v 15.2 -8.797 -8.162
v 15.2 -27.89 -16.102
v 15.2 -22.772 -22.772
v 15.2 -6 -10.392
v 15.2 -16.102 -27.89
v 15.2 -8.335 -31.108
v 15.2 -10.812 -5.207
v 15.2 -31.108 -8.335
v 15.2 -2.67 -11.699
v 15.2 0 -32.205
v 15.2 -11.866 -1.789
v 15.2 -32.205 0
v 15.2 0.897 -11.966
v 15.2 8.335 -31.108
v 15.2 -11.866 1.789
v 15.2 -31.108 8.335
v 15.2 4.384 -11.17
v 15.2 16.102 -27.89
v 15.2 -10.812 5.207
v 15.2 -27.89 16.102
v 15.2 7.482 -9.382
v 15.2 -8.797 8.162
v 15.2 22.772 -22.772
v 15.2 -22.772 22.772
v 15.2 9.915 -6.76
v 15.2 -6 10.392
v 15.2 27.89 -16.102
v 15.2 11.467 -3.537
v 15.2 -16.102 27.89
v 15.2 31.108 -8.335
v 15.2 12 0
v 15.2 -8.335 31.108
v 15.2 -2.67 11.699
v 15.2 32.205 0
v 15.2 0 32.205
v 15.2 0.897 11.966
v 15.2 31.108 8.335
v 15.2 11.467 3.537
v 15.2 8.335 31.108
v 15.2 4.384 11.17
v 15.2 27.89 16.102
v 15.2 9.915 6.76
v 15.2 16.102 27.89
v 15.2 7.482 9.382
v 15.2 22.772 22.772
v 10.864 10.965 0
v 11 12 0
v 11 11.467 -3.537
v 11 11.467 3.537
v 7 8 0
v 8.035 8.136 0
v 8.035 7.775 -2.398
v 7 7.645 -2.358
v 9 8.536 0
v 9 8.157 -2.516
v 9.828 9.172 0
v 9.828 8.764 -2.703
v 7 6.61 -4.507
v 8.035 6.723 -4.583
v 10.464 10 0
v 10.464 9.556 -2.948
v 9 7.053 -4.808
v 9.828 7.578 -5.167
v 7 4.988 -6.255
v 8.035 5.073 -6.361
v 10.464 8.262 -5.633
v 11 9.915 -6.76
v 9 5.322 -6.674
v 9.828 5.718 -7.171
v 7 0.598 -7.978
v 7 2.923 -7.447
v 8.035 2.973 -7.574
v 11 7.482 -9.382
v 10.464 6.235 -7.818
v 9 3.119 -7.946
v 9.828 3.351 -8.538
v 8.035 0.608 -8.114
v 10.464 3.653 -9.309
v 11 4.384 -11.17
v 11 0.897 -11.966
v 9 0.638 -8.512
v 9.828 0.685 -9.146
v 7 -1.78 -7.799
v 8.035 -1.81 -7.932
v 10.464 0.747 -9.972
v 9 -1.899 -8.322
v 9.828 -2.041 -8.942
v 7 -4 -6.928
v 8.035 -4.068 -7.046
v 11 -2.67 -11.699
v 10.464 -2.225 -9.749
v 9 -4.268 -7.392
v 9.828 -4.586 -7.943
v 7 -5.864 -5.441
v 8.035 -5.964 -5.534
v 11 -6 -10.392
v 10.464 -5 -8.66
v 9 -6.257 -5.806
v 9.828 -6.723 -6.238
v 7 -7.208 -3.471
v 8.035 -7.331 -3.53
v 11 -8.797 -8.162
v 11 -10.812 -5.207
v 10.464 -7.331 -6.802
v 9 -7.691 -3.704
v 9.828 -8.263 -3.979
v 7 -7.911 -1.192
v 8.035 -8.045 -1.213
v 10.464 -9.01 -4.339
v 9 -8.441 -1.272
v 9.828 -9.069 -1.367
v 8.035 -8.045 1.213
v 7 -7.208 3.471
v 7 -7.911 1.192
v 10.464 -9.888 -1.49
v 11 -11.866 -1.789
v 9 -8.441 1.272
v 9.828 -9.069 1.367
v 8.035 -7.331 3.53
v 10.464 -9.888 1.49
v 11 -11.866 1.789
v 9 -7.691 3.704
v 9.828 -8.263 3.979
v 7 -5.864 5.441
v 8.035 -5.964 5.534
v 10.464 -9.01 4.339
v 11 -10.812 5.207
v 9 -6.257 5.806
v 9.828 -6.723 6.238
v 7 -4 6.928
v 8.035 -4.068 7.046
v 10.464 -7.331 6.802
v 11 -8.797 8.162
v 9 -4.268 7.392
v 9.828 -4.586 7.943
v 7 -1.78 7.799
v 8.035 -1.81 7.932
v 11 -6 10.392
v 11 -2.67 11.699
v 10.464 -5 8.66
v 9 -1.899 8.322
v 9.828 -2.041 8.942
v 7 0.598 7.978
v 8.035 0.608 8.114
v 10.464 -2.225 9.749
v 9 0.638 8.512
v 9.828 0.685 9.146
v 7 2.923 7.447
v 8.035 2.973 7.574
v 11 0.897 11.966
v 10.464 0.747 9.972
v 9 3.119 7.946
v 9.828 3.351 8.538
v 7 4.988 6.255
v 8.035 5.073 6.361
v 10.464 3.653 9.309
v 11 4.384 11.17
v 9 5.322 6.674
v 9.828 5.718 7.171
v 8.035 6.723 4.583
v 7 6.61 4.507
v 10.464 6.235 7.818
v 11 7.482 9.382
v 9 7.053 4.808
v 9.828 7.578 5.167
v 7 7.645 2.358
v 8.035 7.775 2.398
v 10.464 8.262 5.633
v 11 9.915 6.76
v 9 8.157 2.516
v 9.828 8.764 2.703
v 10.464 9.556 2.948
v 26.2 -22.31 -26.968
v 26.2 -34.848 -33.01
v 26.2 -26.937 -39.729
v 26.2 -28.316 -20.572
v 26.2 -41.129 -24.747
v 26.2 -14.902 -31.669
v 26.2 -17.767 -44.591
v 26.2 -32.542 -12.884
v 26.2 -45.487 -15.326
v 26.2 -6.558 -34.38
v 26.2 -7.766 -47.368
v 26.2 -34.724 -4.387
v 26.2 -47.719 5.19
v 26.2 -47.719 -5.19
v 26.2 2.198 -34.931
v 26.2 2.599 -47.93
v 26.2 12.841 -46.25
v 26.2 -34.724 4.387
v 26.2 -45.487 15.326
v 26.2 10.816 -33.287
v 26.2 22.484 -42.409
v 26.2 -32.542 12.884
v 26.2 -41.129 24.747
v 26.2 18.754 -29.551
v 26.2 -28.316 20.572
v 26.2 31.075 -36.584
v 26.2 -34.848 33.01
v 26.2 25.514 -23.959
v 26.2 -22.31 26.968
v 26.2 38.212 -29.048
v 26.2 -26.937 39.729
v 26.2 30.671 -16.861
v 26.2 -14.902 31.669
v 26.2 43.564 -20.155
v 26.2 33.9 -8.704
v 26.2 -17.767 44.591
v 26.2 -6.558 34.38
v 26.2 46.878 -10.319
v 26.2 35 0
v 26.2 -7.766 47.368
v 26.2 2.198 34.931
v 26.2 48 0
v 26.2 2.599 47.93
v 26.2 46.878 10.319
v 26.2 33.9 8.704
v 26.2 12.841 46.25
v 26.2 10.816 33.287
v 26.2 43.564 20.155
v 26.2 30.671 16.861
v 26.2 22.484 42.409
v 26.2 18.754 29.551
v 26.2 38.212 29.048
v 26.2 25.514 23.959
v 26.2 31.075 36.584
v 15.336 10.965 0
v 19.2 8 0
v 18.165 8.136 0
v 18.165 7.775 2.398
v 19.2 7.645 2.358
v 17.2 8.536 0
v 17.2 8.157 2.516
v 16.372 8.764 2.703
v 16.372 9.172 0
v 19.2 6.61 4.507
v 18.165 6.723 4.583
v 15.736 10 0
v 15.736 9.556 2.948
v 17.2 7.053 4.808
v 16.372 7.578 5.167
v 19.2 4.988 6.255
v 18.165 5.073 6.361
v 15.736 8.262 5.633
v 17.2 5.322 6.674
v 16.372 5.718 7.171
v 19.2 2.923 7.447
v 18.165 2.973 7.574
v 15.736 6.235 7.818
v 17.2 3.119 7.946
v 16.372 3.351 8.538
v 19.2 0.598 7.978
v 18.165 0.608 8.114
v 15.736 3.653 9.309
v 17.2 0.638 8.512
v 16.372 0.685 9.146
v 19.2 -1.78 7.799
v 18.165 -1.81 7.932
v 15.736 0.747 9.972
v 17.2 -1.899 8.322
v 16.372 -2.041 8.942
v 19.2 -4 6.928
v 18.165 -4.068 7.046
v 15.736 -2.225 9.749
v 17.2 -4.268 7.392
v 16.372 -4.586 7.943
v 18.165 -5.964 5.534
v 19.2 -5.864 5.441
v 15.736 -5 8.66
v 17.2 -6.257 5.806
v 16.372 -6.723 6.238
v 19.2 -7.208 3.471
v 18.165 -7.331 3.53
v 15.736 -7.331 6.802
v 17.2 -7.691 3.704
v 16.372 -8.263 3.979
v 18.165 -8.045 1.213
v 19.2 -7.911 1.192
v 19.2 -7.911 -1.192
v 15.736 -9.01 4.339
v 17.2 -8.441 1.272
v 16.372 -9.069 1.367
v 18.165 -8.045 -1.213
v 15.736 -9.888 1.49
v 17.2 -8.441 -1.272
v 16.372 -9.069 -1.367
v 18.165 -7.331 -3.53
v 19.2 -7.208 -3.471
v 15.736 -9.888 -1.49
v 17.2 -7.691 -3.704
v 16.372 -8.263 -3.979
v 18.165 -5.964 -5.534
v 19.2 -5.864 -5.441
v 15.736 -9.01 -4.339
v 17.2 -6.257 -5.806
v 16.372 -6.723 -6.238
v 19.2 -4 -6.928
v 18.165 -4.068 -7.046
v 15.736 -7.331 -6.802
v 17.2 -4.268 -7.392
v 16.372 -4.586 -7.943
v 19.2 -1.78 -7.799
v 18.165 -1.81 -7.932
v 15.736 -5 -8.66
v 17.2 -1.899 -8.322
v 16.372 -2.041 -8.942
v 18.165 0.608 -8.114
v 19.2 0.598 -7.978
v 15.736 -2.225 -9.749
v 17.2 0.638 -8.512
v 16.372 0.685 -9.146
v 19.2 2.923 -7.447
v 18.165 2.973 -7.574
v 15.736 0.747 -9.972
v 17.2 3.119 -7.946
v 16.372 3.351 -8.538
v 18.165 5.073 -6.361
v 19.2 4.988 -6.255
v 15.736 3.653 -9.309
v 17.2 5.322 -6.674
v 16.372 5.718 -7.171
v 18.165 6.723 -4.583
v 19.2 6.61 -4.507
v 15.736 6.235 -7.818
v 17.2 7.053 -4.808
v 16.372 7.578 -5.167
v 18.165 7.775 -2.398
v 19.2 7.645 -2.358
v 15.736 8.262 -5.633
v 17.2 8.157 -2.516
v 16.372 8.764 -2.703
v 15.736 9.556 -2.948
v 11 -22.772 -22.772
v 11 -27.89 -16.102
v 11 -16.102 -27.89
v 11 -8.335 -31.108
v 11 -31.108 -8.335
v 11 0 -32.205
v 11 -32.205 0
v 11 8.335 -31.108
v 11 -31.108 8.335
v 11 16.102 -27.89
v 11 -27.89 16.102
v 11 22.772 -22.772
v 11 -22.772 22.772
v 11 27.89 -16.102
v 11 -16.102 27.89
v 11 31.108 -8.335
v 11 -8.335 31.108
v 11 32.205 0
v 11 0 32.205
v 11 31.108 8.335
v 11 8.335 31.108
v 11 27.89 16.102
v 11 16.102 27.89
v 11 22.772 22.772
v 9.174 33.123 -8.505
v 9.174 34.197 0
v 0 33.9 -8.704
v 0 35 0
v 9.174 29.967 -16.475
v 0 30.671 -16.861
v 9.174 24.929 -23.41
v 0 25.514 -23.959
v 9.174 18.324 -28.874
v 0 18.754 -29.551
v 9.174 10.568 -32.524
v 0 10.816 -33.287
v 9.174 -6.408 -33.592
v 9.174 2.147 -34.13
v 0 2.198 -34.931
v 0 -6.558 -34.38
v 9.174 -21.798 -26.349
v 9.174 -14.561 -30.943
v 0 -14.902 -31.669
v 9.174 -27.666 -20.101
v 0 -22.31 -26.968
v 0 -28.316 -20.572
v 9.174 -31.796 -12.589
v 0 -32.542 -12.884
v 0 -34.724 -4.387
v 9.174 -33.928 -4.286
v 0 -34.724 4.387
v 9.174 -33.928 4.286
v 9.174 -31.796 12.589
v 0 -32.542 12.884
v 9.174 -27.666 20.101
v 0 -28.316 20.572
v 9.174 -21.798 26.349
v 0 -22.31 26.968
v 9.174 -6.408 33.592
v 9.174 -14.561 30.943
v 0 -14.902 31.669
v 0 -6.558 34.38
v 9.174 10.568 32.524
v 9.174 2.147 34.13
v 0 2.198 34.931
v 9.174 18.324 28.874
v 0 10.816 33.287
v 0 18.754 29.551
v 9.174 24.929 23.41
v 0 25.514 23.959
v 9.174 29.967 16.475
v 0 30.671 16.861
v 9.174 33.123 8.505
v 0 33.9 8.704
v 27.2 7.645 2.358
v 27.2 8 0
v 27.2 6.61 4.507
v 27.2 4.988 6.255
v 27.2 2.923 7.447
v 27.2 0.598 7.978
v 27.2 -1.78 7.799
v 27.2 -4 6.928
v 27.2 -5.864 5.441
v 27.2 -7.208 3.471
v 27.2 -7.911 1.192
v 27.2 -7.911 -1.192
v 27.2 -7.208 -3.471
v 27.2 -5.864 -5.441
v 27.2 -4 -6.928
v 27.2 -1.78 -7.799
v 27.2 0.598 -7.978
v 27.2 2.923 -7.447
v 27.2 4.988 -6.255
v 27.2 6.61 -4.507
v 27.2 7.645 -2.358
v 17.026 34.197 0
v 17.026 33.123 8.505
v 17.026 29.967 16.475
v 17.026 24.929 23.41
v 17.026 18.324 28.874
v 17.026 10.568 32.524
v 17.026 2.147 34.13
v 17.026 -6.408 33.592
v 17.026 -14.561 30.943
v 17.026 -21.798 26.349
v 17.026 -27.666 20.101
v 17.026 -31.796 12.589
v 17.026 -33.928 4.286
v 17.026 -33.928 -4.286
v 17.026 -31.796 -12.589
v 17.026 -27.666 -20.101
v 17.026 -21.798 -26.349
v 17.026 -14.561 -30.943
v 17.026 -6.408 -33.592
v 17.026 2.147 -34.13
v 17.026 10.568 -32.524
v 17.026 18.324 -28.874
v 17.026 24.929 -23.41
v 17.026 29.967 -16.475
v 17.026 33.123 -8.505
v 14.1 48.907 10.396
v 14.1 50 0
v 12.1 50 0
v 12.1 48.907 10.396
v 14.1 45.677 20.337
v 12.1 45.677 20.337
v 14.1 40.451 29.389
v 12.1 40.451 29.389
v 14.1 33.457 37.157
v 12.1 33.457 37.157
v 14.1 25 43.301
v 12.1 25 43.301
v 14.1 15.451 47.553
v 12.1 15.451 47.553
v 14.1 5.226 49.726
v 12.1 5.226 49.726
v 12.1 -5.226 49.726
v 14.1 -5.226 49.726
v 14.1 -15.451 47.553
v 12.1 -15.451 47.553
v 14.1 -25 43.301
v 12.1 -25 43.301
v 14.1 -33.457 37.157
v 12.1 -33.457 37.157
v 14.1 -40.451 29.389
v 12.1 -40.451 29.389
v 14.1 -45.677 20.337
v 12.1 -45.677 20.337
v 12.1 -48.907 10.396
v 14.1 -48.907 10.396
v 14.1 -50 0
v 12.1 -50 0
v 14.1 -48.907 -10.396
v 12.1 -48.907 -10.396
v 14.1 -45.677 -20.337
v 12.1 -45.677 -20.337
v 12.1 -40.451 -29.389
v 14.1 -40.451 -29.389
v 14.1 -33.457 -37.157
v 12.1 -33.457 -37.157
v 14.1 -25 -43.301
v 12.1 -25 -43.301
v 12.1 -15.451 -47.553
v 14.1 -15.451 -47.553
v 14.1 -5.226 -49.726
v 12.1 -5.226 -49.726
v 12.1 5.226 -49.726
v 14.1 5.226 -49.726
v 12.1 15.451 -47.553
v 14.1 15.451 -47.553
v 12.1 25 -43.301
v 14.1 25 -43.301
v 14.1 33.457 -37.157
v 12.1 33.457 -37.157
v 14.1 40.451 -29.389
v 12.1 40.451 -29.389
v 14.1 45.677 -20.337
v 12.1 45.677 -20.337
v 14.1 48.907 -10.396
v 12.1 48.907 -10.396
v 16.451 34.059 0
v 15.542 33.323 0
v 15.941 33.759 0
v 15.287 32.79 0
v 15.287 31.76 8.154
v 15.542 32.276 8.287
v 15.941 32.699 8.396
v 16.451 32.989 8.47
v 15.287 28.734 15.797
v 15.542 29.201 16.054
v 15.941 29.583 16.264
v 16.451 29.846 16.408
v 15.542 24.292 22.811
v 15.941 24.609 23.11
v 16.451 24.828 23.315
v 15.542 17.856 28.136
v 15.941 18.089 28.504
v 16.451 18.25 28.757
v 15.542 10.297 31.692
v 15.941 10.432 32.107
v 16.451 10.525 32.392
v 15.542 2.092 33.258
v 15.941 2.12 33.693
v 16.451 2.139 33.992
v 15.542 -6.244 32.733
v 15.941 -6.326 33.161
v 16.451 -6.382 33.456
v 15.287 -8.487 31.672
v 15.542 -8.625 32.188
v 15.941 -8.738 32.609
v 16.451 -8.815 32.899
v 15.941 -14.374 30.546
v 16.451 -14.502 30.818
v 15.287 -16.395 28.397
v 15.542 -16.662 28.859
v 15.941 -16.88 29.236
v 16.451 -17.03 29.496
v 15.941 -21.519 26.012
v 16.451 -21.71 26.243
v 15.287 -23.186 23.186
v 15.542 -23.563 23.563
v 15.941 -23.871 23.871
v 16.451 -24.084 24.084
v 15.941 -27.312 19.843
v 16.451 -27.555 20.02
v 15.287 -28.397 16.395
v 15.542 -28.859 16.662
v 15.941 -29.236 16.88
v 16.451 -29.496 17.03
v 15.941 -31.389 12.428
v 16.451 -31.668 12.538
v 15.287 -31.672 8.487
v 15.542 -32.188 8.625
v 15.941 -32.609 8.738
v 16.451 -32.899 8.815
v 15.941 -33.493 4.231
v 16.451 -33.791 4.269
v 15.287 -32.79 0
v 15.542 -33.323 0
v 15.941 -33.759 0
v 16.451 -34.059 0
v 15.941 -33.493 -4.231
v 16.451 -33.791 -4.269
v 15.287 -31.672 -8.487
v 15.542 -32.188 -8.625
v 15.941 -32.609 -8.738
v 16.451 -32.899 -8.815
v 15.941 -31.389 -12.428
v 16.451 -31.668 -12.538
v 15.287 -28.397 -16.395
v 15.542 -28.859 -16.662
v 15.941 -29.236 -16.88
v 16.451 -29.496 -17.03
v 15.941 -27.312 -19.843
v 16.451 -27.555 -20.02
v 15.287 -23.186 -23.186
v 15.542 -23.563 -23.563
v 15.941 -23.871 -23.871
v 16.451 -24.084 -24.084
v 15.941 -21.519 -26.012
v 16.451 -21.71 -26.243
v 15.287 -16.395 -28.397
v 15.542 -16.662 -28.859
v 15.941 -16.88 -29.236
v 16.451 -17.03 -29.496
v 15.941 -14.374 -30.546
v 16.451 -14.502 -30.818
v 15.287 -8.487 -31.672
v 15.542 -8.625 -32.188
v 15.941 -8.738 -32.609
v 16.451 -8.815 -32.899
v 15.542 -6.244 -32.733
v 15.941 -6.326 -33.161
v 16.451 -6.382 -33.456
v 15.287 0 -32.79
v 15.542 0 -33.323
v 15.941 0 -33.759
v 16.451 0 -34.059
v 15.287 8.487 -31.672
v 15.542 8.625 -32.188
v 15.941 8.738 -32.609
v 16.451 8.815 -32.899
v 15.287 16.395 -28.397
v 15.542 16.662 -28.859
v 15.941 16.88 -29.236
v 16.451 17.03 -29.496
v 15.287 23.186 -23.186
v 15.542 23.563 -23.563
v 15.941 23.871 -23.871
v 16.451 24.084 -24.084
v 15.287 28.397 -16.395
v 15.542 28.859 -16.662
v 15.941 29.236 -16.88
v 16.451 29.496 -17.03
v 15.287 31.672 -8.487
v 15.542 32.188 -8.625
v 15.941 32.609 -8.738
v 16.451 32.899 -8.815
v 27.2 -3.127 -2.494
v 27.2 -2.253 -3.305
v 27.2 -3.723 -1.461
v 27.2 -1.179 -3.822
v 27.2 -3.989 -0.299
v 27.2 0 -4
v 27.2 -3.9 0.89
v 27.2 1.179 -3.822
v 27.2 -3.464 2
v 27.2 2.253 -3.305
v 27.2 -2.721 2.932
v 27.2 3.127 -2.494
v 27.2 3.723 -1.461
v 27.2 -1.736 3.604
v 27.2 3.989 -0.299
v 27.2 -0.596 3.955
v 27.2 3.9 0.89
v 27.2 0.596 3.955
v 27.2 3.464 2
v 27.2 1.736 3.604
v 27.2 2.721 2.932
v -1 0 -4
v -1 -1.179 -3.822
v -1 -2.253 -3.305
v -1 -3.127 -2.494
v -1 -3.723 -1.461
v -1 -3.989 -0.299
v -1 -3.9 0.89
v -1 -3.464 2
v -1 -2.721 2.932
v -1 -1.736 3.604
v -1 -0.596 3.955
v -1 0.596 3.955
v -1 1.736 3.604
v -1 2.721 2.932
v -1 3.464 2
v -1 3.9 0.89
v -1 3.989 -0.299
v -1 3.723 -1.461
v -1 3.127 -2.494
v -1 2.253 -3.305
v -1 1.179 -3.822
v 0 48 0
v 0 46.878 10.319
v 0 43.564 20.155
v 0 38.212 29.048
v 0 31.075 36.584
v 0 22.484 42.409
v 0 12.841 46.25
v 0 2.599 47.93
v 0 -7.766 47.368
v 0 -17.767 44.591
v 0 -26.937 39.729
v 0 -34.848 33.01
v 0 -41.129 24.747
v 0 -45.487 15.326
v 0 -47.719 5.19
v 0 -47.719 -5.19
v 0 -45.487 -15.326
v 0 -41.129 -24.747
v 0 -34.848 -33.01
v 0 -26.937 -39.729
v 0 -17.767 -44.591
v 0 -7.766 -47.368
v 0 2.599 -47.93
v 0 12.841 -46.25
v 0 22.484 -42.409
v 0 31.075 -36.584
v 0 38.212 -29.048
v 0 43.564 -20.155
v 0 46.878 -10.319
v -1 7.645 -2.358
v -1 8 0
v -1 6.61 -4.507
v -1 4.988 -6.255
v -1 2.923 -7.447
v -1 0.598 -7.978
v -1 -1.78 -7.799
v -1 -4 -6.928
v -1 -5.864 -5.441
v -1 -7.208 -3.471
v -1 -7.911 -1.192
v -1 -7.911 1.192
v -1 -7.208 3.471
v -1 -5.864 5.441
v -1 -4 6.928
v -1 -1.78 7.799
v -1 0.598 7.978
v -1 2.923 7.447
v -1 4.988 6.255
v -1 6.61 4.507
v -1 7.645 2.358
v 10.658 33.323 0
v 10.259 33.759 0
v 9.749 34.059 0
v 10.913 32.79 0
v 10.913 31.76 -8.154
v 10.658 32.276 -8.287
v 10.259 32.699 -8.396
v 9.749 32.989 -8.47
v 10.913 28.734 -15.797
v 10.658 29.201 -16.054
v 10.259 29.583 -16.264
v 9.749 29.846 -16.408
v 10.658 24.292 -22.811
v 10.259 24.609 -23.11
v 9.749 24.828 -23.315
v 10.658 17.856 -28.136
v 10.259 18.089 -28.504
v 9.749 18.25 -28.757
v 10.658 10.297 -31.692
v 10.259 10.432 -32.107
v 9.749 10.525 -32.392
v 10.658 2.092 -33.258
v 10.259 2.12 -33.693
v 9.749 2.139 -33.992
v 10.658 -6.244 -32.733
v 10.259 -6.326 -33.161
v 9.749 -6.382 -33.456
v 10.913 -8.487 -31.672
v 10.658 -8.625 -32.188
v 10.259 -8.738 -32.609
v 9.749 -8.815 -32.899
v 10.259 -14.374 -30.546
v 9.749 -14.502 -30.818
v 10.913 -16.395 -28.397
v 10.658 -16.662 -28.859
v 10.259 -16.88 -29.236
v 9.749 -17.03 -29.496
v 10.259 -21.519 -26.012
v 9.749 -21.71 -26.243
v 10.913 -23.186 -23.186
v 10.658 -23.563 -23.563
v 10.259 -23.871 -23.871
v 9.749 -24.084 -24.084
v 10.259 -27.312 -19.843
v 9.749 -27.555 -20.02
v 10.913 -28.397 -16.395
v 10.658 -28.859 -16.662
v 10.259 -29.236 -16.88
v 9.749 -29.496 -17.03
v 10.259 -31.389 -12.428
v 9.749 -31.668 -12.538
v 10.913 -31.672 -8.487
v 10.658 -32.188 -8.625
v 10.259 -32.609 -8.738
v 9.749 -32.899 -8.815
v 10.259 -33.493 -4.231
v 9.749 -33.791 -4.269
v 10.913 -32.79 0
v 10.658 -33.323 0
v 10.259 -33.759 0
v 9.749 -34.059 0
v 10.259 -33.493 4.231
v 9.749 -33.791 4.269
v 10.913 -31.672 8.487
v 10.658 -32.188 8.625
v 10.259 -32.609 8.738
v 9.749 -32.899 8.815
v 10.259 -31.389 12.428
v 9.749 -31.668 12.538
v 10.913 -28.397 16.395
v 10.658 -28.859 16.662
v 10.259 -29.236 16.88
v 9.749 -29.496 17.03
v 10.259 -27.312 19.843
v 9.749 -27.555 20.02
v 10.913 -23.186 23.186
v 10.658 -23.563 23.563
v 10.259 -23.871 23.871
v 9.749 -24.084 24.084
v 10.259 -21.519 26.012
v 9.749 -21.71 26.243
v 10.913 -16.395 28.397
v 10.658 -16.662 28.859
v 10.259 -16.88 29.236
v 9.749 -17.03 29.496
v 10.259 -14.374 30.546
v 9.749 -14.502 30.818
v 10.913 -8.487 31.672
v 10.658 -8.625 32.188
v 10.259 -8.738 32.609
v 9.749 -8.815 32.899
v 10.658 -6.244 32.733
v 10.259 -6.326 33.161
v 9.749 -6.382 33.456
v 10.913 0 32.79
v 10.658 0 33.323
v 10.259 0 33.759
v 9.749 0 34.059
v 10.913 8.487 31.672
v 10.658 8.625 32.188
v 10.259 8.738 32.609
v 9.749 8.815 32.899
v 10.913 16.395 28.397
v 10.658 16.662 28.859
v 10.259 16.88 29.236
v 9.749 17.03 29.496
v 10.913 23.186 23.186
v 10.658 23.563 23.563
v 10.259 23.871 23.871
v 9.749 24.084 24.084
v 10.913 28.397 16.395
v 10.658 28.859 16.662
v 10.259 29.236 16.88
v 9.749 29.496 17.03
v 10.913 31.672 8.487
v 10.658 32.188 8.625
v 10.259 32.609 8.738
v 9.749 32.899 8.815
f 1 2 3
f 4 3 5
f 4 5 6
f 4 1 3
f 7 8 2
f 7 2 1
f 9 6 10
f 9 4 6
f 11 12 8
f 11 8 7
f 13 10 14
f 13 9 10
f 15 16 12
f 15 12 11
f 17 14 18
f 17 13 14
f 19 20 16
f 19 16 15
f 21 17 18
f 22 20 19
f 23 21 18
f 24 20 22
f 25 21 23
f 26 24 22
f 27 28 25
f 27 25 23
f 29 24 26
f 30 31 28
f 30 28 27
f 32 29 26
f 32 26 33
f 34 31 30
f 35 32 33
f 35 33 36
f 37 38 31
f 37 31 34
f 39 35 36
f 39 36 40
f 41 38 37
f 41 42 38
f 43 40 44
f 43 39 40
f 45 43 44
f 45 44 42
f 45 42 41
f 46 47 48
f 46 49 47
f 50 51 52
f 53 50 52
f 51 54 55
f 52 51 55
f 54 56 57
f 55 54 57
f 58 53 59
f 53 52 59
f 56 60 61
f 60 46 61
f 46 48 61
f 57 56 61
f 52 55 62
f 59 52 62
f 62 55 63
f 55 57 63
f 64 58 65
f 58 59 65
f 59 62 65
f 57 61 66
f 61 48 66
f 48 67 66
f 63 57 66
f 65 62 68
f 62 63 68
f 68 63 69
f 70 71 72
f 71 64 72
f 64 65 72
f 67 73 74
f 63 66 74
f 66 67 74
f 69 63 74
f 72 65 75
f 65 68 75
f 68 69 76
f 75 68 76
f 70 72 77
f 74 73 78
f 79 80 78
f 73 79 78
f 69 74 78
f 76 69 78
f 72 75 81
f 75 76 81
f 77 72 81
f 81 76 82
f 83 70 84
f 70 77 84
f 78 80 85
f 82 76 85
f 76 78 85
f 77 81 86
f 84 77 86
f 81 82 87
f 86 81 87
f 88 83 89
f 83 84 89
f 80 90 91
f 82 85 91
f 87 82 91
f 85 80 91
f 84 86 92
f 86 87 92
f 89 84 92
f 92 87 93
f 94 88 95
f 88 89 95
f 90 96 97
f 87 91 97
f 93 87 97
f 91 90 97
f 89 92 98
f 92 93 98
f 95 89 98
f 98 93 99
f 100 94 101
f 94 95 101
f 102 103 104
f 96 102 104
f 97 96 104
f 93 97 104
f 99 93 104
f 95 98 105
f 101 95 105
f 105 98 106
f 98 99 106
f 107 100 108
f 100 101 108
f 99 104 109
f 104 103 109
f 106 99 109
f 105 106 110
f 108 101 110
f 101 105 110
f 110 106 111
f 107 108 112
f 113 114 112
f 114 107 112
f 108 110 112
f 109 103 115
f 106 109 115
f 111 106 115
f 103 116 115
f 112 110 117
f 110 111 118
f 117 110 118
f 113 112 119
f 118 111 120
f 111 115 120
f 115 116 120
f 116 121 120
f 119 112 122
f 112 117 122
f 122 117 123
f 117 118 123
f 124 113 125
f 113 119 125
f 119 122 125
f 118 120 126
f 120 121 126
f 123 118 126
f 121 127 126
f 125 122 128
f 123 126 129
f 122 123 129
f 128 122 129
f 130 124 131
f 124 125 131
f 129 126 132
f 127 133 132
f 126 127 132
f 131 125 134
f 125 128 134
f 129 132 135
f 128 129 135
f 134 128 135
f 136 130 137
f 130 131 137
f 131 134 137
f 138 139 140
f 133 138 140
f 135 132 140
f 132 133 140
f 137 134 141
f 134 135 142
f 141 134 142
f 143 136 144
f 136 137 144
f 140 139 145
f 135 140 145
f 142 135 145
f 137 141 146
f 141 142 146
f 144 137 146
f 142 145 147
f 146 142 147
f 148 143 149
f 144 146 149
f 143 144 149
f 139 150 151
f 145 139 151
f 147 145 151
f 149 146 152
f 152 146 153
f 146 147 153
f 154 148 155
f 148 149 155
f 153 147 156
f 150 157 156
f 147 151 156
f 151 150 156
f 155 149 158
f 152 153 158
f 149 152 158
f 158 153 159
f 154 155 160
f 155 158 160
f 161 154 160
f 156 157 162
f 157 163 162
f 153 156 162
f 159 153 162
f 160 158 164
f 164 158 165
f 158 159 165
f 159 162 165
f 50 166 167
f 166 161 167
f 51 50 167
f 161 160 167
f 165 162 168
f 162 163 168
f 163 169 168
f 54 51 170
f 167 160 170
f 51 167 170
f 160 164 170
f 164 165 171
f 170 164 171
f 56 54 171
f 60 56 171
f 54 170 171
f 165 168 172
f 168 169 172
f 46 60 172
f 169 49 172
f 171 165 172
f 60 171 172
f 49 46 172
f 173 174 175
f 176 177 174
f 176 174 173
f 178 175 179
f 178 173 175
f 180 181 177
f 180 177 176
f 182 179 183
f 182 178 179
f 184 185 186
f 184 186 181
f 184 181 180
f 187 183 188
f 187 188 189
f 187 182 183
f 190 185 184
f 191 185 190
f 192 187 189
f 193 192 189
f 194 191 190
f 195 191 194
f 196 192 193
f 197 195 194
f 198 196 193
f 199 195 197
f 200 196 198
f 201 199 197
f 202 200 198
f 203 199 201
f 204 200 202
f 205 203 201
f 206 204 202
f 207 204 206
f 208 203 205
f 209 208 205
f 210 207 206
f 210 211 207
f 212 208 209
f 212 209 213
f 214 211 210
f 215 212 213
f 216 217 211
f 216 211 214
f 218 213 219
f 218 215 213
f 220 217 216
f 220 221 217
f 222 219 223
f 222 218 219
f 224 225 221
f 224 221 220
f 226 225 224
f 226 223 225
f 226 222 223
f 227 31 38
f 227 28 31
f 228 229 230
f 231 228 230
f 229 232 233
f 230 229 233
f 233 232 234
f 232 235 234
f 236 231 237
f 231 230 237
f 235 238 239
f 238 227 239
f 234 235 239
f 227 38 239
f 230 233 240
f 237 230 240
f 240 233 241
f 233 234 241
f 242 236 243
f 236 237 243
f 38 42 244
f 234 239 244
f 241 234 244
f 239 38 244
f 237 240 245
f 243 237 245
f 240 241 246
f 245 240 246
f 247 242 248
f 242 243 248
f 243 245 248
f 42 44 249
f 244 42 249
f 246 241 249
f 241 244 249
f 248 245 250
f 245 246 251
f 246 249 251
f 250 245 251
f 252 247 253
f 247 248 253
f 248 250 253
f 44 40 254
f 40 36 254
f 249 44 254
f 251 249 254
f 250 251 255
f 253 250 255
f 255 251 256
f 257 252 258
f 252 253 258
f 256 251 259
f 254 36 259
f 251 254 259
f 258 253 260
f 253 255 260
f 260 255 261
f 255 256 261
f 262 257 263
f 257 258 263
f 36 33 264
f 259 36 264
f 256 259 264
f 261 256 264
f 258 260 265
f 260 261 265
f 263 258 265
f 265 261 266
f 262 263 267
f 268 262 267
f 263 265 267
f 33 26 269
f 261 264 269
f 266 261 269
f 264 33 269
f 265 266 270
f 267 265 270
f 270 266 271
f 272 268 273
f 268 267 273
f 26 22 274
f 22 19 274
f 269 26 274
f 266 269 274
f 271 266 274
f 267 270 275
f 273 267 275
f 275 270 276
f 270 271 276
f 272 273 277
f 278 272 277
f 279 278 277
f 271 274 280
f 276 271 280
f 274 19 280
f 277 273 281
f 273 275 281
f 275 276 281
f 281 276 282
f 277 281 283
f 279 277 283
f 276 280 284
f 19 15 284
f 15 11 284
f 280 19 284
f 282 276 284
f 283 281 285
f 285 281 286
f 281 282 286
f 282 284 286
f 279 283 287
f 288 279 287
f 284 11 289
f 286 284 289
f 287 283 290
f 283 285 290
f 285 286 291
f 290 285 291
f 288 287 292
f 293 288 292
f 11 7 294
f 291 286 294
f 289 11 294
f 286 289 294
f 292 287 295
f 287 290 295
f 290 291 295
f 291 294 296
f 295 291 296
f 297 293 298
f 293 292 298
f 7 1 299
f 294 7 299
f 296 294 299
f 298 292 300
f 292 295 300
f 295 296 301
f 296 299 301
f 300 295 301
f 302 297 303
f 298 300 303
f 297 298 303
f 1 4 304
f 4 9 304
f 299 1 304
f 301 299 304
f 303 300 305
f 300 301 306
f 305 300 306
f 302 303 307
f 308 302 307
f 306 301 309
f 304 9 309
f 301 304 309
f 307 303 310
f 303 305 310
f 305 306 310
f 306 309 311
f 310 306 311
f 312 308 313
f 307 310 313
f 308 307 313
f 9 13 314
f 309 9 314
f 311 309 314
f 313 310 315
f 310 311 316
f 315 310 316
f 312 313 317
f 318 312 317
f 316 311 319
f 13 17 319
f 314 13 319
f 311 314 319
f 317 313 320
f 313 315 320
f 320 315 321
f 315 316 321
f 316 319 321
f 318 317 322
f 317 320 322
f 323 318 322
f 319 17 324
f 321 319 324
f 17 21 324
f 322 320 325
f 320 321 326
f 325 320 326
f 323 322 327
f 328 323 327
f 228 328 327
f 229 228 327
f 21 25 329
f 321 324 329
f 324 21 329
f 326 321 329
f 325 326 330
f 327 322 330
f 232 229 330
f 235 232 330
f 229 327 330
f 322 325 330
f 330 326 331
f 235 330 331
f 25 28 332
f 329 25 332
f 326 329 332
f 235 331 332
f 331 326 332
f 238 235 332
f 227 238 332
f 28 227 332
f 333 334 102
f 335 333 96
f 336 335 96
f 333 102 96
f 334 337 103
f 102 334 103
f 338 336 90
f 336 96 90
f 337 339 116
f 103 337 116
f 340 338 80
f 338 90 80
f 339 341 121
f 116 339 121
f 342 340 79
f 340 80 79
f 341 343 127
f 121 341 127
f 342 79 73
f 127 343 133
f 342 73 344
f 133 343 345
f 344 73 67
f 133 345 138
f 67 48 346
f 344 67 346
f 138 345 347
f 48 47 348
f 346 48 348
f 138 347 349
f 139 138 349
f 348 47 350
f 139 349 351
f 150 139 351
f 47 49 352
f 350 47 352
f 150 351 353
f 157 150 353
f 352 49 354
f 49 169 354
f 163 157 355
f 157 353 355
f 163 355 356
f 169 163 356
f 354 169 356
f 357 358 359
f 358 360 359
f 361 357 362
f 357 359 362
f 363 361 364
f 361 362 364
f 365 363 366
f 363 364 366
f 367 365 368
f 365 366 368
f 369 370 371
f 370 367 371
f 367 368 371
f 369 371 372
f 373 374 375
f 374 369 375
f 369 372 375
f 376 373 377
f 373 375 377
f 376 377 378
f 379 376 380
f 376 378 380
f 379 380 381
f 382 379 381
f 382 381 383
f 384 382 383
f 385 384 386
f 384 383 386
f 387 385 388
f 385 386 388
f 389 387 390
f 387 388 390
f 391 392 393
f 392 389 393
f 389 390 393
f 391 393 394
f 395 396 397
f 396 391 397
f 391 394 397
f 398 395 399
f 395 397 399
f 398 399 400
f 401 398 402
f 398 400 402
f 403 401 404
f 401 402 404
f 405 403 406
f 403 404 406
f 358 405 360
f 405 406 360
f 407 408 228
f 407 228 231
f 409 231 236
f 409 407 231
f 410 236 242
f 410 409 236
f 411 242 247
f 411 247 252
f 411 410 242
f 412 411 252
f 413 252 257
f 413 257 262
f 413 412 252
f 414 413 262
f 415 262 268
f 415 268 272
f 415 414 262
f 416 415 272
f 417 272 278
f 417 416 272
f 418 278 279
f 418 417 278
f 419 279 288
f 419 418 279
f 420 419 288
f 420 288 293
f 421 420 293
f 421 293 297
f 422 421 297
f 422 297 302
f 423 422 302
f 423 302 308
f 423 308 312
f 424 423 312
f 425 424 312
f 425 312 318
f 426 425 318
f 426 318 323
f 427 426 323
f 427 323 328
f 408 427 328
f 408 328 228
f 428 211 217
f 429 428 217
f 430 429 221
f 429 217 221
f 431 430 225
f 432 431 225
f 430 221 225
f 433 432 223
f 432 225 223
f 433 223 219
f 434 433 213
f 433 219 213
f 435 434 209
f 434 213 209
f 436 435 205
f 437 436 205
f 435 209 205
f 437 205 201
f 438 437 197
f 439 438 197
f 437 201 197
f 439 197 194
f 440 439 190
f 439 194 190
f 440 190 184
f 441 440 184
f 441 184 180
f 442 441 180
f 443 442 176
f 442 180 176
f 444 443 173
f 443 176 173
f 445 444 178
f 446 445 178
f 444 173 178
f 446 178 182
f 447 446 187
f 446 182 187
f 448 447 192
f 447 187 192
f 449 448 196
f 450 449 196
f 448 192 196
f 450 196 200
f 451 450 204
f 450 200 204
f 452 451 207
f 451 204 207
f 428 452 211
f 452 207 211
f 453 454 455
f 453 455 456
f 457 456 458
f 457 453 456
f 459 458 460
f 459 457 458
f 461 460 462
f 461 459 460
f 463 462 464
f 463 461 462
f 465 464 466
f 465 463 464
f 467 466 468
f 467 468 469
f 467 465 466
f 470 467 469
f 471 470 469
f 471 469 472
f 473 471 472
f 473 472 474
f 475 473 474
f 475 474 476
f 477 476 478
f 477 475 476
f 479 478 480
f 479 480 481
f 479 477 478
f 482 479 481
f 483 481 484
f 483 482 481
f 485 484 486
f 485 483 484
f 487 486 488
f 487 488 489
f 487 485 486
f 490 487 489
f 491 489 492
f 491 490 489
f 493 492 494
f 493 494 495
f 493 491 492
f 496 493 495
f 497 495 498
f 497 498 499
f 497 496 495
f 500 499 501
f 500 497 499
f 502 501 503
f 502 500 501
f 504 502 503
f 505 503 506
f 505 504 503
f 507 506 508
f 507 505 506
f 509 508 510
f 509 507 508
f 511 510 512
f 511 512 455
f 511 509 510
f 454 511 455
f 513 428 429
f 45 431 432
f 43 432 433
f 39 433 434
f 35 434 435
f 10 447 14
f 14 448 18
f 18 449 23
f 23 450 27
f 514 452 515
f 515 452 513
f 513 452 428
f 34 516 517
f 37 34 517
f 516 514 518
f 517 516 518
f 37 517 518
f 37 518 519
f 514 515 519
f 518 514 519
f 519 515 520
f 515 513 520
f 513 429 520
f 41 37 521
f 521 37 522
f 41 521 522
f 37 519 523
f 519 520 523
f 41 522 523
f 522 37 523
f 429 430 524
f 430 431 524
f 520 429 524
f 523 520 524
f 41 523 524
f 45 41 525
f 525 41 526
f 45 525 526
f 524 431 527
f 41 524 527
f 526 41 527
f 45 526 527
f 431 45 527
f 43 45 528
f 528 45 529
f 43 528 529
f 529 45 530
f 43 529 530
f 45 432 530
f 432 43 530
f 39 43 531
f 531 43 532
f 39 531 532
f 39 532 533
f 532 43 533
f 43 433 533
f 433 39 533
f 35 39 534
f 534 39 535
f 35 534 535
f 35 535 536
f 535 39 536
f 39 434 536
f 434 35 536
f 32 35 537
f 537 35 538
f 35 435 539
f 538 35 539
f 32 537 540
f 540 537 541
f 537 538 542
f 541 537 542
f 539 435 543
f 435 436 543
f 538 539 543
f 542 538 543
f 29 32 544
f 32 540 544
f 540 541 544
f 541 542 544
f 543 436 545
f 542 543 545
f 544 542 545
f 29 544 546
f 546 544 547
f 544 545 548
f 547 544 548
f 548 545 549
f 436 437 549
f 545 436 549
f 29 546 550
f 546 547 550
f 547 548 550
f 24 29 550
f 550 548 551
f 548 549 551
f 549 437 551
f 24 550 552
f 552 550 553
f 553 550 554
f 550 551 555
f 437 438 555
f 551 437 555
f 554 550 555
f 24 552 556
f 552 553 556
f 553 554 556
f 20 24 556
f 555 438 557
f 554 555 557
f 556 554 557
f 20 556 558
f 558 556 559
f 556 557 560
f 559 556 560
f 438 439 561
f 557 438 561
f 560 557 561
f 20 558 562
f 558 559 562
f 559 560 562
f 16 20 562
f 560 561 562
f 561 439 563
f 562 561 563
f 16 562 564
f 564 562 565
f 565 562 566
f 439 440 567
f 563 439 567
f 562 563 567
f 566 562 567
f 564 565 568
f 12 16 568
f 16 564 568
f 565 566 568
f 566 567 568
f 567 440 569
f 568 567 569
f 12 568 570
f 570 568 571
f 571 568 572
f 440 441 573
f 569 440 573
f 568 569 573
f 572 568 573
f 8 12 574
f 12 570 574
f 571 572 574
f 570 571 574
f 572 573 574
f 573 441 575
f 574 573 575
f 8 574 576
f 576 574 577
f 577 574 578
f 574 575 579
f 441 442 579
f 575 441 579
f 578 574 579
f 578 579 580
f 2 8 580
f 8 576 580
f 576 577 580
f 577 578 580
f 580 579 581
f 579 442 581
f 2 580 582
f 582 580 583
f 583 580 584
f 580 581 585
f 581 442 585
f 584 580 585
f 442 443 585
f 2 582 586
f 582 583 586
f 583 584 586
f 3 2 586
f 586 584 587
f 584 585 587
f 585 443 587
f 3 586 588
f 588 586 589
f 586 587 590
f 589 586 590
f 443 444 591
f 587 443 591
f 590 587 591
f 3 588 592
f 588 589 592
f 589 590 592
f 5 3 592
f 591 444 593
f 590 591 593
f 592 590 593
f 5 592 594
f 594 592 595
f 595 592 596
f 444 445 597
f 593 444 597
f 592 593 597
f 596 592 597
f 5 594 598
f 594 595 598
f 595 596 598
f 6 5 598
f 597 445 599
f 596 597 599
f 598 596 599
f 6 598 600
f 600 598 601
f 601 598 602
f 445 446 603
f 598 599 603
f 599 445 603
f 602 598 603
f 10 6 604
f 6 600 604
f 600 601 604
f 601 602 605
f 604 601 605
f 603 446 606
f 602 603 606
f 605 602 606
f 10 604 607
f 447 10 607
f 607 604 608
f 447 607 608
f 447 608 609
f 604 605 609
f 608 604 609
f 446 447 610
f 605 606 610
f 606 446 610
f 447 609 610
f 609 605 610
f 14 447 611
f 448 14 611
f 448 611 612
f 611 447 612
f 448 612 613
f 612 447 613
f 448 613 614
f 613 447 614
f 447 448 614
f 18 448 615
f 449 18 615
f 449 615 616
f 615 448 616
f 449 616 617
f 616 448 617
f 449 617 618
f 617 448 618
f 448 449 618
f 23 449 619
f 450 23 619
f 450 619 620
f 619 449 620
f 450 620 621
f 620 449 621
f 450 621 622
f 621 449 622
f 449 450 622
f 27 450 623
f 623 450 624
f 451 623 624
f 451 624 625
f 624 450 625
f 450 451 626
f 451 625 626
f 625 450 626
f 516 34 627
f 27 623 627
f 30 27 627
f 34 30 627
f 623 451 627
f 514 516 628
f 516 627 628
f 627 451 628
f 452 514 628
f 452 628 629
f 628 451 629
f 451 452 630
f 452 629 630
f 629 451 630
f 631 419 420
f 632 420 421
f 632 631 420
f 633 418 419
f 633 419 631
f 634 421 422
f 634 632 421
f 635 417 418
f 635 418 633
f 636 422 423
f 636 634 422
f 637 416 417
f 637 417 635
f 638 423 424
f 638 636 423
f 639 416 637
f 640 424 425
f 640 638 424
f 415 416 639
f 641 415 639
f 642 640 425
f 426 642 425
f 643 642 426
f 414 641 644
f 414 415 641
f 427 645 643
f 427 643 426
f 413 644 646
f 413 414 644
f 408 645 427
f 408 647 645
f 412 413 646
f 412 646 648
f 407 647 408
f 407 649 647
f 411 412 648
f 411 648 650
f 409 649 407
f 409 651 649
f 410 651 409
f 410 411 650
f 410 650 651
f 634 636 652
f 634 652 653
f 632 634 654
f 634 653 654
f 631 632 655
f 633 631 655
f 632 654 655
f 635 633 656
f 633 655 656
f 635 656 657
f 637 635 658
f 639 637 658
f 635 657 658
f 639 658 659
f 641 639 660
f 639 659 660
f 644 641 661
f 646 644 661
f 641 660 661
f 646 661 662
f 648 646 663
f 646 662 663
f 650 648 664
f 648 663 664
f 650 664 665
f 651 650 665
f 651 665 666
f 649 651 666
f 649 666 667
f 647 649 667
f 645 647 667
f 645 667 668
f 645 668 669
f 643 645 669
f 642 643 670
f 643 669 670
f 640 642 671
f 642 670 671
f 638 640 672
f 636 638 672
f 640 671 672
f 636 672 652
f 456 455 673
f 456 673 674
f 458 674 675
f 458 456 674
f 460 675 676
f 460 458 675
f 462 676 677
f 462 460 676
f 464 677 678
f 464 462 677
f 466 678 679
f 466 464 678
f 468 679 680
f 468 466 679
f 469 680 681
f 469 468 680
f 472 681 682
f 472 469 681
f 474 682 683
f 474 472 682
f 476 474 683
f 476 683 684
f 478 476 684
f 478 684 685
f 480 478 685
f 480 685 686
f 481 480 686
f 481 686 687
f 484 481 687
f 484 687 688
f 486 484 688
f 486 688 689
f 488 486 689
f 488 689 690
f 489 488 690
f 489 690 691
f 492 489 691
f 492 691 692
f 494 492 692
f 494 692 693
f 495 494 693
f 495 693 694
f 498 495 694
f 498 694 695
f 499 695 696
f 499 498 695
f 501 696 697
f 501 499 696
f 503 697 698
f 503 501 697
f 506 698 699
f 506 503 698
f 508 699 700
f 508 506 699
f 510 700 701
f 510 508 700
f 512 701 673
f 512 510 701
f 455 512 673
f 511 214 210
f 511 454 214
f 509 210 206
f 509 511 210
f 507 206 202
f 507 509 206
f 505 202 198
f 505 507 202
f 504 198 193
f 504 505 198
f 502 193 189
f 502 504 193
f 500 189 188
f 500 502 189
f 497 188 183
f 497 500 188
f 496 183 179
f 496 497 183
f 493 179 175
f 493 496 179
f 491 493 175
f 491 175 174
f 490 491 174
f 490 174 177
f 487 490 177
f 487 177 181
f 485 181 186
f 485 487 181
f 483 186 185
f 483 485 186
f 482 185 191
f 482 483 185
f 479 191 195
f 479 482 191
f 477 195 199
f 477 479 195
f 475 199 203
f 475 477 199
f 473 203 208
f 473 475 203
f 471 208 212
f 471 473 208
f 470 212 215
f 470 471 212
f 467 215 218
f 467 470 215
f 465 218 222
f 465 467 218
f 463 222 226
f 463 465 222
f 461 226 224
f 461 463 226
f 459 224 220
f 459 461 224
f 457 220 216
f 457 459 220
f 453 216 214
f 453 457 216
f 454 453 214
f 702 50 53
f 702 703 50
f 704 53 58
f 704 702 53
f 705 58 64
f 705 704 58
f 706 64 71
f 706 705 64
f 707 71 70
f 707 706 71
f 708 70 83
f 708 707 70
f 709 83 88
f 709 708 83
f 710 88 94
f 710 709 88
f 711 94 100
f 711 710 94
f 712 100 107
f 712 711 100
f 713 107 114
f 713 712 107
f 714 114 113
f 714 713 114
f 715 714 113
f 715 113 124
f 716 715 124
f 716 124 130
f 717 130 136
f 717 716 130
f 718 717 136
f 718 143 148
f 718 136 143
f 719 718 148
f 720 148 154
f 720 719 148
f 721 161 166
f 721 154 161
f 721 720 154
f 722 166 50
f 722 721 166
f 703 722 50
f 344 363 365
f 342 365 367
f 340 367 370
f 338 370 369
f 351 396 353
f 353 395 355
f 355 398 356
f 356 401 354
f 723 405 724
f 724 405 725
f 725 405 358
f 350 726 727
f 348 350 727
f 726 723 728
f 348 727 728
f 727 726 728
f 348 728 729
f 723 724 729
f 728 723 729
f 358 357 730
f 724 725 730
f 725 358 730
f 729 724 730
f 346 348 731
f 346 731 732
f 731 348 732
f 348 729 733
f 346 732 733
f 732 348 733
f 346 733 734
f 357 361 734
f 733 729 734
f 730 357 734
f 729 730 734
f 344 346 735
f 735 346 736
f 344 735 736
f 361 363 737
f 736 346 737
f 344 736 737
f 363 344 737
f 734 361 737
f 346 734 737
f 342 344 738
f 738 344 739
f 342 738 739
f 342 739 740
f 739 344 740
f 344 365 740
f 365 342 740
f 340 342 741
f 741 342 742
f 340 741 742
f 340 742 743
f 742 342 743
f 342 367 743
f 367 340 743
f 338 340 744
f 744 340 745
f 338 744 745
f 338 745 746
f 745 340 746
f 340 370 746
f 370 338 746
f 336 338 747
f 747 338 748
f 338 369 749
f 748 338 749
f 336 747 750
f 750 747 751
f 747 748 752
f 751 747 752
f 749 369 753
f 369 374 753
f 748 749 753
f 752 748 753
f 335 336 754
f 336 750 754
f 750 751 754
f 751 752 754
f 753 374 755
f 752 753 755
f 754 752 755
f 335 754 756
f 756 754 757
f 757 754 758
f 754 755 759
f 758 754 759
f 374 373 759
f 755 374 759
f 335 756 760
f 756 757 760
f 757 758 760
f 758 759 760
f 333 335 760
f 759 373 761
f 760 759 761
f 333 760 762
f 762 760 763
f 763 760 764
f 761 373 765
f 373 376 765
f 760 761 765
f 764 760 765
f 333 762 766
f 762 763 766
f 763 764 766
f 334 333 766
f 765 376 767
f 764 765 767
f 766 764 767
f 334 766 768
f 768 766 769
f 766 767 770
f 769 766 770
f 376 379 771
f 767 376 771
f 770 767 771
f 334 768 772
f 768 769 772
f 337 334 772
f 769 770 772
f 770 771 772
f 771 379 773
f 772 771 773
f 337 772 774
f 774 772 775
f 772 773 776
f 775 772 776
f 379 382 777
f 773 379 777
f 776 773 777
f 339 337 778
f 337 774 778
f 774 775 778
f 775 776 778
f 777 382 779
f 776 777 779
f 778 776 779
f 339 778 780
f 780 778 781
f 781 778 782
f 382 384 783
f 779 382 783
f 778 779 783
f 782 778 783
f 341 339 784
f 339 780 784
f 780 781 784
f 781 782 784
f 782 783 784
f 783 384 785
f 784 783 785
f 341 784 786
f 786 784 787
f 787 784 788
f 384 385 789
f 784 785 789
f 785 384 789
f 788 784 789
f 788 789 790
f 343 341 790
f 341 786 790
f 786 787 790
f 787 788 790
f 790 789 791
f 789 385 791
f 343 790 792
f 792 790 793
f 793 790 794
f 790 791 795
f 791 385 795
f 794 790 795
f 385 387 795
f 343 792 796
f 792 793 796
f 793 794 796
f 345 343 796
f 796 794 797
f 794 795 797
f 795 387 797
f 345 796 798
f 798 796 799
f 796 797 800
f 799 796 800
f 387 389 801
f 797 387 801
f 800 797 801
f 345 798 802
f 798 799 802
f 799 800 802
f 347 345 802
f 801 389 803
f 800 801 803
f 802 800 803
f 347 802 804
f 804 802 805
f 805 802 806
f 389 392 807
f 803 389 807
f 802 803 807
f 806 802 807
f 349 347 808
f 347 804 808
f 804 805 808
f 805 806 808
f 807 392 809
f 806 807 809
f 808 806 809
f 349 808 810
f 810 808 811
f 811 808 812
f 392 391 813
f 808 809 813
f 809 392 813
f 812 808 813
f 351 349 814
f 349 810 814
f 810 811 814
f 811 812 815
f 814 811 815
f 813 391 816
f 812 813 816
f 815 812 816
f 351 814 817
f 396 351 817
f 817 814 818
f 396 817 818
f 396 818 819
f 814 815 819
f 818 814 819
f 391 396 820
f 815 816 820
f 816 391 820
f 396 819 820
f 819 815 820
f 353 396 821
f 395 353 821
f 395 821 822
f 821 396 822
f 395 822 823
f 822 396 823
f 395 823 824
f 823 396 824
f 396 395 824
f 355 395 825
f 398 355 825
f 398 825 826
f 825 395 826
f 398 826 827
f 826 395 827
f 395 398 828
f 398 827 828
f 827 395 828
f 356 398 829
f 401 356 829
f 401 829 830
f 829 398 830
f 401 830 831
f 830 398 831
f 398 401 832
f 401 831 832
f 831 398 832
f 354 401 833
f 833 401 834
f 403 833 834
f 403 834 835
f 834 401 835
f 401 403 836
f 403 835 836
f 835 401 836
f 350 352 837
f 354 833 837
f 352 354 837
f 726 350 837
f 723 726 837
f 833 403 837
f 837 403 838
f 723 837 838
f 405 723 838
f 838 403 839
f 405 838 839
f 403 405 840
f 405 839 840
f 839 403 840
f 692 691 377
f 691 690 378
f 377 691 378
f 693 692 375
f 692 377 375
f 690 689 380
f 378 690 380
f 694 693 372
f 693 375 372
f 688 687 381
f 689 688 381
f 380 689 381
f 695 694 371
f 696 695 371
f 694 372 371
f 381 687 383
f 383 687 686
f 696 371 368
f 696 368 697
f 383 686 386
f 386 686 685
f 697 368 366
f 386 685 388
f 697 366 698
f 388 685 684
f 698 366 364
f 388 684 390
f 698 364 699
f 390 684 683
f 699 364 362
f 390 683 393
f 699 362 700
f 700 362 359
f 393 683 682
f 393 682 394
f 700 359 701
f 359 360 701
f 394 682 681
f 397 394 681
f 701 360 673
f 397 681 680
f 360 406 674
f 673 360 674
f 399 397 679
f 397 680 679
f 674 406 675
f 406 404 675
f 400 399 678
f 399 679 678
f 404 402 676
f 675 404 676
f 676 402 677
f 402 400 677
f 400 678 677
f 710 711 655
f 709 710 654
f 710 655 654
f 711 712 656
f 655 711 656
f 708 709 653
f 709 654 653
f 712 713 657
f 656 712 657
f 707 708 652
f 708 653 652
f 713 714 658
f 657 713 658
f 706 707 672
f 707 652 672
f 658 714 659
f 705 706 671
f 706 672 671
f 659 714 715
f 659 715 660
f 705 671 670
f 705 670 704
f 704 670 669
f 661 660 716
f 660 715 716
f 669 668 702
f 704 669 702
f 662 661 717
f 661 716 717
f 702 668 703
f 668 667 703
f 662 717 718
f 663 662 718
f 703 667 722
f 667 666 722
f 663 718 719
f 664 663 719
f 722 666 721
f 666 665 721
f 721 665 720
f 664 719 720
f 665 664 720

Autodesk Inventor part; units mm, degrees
ref_plane "YZ Plane" through (0, 0, 0) normal (1, 0, 0) x (0, 1, 0)
ref_plane "XZ Plane" through (0, 0, 0) normal (0, 1, 0) x (-1, 0, 0)
ref_plane "XY Plane" through (0, 0, 0) normal (0, 0, 1) x (1, 0, 0)
sketch "Sketch1" plane through (0, 0, 0) normal (0, 0, 1) x (1, 0, 0)
  line L0 (0, 0) -> (37.6224, 0)
  line L1 (0, 35) -> (0, 48)
  line L2 (0, 48) -> (12.1, 50)
  line L3 (12.1, 50) -> (13.1, 50)
  line L4 (0, 35) -> (11, 34.0376)
  line L5 (11, 34.0376) -> (11, 8)
  line L6 (11, 8) -> (-1, 8)
  line L7 (-1, 8) -> (-1, 0)
  line L8 (13.1, 50) -> (13.1, 0)
  line L9 (-1, 0) -> (13.1, 0)
  line L10 (26.2, 35) -> (26.2, 48)
  line L11 (26.2, 48) -> (14.1, 50)
  line L12 (14.1, 50) -> (13.1, 50)
  line L13 (26.2, 35) -> (15.2, 34.0376)
  line L14 (15.2, 34.0376) -> (15.2, 8)
  line L15 (15.2, 8) -> (27.2, 8)
  line L16 (27.2, 8) -> (27.2, 0)
  line L17 (27.2, 0) -> (13.1, 0)
  point P0 (26.2, 0)
  dimension "d0" = 100
  dimension "d2" = 1
  dimension "d3" = 13
  dimension "d4" = 13.1
  dimension "d5" = 11
  dimension "d6" = 95
  dimension "d7" = 16
  dimension "d8" = 12
  dimension "d9" = 48
revolve "Revolution1" add sketch "Sketch1" angle 360 about axis through (0, 0, 0) along (1, 0, 0)
hole "Hole1" at (27.2, 0, 0) direction (-1, 0, 0) diameter 8 end through all
fillet "Fillet1" radius 4 2 edges at (15.2, -8, 0) (11, -8, 0)
fillet "Fillet2" radius 2 2 edges at (15.2, -34.0376, 0) (11, -34.0376, 0)
properties part number "Hjul"
